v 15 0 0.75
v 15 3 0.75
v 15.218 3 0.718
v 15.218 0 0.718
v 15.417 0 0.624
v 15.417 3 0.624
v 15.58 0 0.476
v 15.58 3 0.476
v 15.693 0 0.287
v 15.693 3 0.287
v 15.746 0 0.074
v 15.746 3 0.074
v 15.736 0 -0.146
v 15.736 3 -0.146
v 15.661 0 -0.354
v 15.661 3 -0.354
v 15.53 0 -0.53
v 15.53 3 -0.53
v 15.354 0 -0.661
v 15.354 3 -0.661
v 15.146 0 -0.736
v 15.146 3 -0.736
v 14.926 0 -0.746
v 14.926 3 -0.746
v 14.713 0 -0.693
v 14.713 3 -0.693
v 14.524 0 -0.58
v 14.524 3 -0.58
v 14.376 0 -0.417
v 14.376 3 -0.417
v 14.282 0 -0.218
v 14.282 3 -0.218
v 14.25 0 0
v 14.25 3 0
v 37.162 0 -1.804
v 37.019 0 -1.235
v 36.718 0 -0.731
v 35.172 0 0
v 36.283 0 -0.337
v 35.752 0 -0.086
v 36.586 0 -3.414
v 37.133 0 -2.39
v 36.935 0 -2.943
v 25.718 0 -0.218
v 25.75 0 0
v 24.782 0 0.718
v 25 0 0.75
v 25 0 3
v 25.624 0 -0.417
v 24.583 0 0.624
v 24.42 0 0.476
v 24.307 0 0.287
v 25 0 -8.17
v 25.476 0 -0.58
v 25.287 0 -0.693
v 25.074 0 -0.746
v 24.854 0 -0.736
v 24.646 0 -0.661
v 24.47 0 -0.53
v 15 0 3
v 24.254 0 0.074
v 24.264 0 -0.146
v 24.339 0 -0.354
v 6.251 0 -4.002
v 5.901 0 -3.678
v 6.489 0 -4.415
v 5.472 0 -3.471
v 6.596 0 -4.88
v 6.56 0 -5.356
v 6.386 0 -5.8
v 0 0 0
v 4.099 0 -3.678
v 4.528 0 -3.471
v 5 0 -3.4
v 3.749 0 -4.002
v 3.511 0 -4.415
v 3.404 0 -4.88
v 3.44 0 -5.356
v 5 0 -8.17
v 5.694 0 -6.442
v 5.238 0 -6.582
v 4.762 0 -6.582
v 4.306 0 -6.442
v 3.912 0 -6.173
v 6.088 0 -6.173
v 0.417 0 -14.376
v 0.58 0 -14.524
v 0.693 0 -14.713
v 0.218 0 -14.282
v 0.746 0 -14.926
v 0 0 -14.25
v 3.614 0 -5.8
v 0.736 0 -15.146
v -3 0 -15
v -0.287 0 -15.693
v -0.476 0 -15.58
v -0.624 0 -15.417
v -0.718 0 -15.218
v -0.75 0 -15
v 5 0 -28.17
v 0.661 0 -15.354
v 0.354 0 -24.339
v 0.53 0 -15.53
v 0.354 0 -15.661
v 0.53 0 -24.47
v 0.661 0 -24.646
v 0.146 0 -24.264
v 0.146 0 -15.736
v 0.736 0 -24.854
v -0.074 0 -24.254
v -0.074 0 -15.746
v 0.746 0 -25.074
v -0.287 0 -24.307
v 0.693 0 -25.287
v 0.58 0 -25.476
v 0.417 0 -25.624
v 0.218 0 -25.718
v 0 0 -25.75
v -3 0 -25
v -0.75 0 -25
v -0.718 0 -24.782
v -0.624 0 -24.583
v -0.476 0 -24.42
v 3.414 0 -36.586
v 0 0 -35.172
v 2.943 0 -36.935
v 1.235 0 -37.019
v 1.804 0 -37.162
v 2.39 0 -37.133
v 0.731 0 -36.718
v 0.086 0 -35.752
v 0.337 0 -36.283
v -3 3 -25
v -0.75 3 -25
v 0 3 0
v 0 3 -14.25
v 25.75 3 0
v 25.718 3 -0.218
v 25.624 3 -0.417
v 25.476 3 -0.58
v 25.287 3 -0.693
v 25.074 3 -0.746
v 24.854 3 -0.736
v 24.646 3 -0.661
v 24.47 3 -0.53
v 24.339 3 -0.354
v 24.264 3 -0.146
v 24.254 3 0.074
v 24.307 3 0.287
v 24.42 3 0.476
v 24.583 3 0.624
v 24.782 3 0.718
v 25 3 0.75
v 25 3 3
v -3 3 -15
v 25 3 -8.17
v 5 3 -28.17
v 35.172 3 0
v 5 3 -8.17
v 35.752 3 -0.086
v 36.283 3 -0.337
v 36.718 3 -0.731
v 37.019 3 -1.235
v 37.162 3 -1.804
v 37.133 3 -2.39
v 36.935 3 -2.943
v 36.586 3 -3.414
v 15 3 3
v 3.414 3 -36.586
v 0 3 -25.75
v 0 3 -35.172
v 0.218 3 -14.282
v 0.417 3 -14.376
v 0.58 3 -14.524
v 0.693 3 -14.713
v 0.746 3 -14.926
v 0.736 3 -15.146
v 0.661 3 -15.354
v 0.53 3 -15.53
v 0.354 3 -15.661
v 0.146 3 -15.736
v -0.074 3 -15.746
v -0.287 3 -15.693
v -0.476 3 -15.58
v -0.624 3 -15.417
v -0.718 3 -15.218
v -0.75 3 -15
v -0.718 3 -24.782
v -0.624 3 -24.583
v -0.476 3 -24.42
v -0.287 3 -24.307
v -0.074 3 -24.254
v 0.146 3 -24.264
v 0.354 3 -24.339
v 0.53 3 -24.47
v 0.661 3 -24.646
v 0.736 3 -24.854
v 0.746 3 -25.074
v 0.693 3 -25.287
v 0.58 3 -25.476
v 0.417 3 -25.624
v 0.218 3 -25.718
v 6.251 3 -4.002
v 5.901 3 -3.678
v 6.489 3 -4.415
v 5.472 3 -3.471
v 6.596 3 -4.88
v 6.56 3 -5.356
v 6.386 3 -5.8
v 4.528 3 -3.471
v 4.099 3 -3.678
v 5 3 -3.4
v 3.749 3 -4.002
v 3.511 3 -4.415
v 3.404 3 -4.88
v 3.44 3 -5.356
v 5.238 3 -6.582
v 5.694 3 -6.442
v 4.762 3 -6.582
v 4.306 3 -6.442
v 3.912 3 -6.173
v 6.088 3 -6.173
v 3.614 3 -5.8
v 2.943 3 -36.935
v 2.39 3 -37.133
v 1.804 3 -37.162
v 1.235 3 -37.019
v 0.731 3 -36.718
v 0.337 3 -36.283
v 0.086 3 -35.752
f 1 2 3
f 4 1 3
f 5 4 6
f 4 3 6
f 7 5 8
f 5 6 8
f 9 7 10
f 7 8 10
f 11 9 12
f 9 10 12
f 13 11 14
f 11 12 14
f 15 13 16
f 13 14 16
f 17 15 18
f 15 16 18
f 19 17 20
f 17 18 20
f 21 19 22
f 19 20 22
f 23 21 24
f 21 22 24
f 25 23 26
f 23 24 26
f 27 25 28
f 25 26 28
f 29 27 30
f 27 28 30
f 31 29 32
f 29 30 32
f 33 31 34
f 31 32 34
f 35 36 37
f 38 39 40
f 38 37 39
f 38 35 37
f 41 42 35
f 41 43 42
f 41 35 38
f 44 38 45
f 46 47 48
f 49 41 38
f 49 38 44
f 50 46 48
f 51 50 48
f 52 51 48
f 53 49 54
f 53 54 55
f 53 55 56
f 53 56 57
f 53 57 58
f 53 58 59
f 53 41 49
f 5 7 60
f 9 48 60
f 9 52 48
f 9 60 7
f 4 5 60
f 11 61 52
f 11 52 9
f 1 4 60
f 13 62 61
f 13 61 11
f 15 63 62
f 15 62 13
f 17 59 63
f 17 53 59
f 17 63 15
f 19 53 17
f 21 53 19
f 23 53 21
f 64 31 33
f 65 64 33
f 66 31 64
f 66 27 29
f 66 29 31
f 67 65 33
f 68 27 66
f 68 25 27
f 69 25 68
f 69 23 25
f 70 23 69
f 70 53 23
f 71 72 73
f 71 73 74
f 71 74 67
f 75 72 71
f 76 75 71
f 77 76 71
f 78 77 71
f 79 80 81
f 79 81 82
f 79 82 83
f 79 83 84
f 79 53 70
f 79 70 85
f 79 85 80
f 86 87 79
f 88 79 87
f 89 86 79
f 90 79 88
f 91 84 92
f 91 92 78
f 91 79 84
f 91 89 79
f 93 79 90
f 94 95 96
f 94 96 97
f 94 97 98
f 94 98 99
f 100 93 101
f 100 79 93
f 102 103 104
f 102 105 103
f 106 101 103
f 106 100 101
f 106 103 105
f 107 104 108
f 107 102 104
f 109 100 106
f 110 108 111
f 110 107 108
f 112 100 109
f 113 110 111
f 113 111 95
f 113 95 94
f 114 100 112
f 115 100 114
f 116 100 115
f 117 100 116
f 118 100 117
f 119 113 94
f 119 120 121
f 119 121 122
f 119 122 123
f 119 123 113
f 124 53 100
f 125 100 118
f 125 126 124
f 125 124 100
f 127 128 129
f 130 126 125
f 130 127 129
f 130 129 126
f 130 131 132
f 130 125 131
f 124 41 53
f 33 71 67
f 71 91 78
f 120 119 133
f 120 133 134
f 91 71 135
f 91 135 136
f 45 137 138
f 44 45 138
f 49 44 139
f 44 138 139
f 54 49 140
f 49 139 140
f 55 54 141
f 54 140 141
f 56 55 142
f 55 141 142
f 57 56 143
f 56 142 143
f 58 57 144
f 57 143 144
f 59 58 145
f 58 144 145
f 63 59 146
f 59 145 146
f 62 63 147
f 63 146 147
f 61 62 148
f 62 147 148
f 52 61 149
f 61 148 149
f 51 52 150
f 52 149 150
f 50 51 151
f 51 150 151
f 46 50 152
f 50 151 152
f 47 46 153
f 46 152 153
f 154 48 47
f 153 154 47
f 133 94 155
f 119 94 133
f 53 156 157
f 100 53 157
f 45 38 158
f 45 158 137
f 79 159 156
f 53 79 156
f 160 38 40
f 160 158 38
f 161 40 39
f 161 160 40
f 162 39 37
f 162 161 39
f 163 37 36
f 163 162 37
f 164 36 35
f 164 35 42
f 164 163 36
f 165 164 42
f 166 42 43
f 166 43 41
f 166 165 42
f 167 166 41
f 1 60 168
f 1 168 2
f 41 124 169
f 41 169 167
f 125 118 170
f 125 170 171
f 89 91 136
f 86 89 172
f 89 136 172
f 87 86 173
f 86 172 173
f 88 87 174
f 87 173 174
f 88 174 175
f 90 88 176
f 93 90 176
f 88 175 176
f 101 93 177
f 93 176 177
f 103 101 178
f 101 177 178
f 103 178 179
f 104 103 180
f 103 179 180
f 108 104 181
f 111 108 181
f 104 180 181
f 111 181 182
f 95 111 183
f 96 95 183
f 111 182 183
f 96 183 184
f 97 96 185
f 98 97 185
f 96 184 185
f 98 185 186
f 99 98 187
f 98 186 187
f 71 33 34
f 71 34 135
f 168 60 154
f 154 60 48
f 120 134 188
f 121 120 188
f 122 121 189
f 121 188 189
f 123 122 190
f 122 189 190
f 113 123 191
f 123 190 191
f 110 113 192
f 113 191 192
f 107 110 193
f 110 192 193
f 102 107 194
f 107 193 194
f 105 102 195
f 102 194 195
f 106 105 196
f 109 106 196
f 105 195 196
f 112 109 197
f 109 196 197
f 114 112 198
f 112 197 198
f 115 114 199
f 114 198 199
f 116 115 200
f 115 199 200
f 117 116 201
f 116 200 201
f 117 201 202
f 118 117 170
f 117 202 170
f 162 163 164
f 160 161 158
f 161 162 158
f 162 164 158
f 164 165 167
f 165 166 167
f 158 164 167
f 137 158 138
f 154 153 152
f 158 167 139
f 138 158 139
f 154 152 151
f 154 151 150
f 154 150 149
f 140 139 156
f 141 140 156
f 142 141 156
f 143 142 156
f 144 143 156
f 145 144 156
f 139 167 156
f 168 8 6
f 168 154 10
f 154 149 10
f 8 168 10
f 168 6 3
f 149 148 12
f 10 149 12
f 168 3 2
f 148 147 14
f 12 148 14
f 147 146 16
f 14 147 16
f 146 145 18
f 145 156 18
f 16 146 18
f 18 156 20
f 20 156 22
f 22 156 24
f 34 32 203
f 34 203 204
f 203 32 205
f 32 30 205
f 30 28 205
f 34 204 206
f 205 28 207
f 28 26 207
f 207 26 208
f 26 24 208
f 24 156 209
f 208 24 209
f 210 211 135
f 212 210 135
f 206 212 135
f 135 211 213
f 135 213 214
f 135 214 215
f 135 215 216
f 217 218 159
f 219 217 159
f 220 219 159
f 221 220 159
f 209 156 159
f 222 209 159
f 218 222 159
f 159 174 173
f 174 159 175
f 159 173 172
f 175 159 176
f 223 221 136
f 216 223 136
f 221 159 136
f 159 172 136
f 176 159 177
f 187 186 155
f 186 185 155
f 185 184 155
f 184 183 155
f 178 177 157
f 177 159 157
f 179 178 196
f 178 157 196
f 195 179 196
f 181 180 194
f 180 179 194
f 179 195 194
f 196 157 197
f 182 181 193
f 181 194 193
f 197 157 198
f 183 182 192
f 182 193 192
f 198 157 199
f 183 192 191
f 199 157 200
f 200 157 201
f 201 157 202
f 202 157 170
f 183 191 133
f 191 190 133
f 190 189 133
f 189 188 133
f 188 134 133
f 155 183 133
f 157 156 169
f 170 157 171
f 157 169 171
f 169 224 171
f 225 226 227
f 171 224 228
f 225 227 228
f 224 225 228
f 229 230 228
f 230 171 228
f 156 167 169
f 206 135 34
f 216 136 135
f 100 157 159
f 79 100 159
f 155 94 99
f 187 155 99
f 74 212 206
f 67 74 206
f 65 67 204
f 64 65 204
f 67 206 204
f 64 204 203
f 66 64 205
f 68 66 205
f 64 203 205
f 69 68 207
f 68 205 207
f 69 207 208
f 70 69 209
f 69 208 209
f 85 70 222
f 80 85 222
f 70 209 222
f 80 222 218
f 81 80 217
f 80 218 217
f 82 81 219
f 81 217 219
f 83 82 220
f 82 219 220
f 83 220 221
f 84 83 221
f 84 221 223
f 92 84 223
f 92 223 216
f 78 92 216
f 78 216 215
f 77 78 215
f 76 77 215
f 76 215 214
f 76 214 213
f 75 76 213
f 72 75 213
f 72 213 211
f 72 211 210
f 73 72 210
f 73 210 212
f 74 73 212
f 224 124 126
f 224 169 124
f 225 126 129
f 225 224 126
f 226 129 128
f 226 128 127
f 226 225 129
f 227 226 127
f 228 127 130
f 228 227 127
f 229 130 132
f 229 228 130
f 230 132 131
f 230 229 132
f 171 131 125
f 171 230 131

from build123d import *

# Parameters (mm, degrees)
SKETCH_1_W          = 3
SKETCH_1_H          = 10
SKETCH_1_W_2        = 10
SKETCH_1_H_2        = 3
EXTRUDE_1_DEPTH     = 3
SKETCH_2_R          = 1.6
SKETCH_2_R_2        = 0.75
CUT_EXTRUDE_1_DEPTH = 57.648036153
FILLET_1_R          = 2


with BuildPart() as part:
    # 草图1 → 凸台-拉伸1 (new body)
    with BuildSketch(Plane(origin=(0, 0, 0), x_dir=(1, 0, 0), z_dir=(0, 1, 0))):
        Polygon((40, 0), (0, 0), (0, 40), align=None)
        with Locations((-1.5, 20)):
            Rectangle(SKETCH_1_W, SKETCH_1_H)
        with Locations((20, -1.5)):
            Rectangle(SKETCH_1_W_2, SKETCH_1_H_2)
    extrude(amount=EXTRUDE_1_DEPTH)

    # 草图2 → 切除-拉伸1 (cut, through all)
    with BuildSketch(Plane(origin=(0, 3, 0), x_dir=(1, 0, 0), z_dir=(0, 1, 0))):
        with Locations(Location((5, 5, 0), (0, 0, 270))):
            Circle(SKETCH_2_R)
        with Locations((0, 25)):
            Circle(SKETCH_2_R_2)
        with Locations((0, 15)):
            Circle(SKETCH_2_R_2)
        with Locations((15, 0)):
            Circle(SKETCH_2_R_2)
        with Locations((25, 0)):
            Circle(SKETCH_2_R_2)
        Polygon((5, 28.169760455), (5, 8.169760455), (25, 8.169760455), align=None)
    extrude(amount=-CUT_EXTRUDE_1_DEPTH, mode=Mode.SUBTRACT)

    # 圆角1
    fillet_1_edges = [part.edges().sort_by_distance(p)[0] for p in [
        (0, 1.5, -40),
        (40, 1.5, 0),
    ]]
    fillet(fillet_1_edges, radius=FILLET_1_R)


solid = part.part
